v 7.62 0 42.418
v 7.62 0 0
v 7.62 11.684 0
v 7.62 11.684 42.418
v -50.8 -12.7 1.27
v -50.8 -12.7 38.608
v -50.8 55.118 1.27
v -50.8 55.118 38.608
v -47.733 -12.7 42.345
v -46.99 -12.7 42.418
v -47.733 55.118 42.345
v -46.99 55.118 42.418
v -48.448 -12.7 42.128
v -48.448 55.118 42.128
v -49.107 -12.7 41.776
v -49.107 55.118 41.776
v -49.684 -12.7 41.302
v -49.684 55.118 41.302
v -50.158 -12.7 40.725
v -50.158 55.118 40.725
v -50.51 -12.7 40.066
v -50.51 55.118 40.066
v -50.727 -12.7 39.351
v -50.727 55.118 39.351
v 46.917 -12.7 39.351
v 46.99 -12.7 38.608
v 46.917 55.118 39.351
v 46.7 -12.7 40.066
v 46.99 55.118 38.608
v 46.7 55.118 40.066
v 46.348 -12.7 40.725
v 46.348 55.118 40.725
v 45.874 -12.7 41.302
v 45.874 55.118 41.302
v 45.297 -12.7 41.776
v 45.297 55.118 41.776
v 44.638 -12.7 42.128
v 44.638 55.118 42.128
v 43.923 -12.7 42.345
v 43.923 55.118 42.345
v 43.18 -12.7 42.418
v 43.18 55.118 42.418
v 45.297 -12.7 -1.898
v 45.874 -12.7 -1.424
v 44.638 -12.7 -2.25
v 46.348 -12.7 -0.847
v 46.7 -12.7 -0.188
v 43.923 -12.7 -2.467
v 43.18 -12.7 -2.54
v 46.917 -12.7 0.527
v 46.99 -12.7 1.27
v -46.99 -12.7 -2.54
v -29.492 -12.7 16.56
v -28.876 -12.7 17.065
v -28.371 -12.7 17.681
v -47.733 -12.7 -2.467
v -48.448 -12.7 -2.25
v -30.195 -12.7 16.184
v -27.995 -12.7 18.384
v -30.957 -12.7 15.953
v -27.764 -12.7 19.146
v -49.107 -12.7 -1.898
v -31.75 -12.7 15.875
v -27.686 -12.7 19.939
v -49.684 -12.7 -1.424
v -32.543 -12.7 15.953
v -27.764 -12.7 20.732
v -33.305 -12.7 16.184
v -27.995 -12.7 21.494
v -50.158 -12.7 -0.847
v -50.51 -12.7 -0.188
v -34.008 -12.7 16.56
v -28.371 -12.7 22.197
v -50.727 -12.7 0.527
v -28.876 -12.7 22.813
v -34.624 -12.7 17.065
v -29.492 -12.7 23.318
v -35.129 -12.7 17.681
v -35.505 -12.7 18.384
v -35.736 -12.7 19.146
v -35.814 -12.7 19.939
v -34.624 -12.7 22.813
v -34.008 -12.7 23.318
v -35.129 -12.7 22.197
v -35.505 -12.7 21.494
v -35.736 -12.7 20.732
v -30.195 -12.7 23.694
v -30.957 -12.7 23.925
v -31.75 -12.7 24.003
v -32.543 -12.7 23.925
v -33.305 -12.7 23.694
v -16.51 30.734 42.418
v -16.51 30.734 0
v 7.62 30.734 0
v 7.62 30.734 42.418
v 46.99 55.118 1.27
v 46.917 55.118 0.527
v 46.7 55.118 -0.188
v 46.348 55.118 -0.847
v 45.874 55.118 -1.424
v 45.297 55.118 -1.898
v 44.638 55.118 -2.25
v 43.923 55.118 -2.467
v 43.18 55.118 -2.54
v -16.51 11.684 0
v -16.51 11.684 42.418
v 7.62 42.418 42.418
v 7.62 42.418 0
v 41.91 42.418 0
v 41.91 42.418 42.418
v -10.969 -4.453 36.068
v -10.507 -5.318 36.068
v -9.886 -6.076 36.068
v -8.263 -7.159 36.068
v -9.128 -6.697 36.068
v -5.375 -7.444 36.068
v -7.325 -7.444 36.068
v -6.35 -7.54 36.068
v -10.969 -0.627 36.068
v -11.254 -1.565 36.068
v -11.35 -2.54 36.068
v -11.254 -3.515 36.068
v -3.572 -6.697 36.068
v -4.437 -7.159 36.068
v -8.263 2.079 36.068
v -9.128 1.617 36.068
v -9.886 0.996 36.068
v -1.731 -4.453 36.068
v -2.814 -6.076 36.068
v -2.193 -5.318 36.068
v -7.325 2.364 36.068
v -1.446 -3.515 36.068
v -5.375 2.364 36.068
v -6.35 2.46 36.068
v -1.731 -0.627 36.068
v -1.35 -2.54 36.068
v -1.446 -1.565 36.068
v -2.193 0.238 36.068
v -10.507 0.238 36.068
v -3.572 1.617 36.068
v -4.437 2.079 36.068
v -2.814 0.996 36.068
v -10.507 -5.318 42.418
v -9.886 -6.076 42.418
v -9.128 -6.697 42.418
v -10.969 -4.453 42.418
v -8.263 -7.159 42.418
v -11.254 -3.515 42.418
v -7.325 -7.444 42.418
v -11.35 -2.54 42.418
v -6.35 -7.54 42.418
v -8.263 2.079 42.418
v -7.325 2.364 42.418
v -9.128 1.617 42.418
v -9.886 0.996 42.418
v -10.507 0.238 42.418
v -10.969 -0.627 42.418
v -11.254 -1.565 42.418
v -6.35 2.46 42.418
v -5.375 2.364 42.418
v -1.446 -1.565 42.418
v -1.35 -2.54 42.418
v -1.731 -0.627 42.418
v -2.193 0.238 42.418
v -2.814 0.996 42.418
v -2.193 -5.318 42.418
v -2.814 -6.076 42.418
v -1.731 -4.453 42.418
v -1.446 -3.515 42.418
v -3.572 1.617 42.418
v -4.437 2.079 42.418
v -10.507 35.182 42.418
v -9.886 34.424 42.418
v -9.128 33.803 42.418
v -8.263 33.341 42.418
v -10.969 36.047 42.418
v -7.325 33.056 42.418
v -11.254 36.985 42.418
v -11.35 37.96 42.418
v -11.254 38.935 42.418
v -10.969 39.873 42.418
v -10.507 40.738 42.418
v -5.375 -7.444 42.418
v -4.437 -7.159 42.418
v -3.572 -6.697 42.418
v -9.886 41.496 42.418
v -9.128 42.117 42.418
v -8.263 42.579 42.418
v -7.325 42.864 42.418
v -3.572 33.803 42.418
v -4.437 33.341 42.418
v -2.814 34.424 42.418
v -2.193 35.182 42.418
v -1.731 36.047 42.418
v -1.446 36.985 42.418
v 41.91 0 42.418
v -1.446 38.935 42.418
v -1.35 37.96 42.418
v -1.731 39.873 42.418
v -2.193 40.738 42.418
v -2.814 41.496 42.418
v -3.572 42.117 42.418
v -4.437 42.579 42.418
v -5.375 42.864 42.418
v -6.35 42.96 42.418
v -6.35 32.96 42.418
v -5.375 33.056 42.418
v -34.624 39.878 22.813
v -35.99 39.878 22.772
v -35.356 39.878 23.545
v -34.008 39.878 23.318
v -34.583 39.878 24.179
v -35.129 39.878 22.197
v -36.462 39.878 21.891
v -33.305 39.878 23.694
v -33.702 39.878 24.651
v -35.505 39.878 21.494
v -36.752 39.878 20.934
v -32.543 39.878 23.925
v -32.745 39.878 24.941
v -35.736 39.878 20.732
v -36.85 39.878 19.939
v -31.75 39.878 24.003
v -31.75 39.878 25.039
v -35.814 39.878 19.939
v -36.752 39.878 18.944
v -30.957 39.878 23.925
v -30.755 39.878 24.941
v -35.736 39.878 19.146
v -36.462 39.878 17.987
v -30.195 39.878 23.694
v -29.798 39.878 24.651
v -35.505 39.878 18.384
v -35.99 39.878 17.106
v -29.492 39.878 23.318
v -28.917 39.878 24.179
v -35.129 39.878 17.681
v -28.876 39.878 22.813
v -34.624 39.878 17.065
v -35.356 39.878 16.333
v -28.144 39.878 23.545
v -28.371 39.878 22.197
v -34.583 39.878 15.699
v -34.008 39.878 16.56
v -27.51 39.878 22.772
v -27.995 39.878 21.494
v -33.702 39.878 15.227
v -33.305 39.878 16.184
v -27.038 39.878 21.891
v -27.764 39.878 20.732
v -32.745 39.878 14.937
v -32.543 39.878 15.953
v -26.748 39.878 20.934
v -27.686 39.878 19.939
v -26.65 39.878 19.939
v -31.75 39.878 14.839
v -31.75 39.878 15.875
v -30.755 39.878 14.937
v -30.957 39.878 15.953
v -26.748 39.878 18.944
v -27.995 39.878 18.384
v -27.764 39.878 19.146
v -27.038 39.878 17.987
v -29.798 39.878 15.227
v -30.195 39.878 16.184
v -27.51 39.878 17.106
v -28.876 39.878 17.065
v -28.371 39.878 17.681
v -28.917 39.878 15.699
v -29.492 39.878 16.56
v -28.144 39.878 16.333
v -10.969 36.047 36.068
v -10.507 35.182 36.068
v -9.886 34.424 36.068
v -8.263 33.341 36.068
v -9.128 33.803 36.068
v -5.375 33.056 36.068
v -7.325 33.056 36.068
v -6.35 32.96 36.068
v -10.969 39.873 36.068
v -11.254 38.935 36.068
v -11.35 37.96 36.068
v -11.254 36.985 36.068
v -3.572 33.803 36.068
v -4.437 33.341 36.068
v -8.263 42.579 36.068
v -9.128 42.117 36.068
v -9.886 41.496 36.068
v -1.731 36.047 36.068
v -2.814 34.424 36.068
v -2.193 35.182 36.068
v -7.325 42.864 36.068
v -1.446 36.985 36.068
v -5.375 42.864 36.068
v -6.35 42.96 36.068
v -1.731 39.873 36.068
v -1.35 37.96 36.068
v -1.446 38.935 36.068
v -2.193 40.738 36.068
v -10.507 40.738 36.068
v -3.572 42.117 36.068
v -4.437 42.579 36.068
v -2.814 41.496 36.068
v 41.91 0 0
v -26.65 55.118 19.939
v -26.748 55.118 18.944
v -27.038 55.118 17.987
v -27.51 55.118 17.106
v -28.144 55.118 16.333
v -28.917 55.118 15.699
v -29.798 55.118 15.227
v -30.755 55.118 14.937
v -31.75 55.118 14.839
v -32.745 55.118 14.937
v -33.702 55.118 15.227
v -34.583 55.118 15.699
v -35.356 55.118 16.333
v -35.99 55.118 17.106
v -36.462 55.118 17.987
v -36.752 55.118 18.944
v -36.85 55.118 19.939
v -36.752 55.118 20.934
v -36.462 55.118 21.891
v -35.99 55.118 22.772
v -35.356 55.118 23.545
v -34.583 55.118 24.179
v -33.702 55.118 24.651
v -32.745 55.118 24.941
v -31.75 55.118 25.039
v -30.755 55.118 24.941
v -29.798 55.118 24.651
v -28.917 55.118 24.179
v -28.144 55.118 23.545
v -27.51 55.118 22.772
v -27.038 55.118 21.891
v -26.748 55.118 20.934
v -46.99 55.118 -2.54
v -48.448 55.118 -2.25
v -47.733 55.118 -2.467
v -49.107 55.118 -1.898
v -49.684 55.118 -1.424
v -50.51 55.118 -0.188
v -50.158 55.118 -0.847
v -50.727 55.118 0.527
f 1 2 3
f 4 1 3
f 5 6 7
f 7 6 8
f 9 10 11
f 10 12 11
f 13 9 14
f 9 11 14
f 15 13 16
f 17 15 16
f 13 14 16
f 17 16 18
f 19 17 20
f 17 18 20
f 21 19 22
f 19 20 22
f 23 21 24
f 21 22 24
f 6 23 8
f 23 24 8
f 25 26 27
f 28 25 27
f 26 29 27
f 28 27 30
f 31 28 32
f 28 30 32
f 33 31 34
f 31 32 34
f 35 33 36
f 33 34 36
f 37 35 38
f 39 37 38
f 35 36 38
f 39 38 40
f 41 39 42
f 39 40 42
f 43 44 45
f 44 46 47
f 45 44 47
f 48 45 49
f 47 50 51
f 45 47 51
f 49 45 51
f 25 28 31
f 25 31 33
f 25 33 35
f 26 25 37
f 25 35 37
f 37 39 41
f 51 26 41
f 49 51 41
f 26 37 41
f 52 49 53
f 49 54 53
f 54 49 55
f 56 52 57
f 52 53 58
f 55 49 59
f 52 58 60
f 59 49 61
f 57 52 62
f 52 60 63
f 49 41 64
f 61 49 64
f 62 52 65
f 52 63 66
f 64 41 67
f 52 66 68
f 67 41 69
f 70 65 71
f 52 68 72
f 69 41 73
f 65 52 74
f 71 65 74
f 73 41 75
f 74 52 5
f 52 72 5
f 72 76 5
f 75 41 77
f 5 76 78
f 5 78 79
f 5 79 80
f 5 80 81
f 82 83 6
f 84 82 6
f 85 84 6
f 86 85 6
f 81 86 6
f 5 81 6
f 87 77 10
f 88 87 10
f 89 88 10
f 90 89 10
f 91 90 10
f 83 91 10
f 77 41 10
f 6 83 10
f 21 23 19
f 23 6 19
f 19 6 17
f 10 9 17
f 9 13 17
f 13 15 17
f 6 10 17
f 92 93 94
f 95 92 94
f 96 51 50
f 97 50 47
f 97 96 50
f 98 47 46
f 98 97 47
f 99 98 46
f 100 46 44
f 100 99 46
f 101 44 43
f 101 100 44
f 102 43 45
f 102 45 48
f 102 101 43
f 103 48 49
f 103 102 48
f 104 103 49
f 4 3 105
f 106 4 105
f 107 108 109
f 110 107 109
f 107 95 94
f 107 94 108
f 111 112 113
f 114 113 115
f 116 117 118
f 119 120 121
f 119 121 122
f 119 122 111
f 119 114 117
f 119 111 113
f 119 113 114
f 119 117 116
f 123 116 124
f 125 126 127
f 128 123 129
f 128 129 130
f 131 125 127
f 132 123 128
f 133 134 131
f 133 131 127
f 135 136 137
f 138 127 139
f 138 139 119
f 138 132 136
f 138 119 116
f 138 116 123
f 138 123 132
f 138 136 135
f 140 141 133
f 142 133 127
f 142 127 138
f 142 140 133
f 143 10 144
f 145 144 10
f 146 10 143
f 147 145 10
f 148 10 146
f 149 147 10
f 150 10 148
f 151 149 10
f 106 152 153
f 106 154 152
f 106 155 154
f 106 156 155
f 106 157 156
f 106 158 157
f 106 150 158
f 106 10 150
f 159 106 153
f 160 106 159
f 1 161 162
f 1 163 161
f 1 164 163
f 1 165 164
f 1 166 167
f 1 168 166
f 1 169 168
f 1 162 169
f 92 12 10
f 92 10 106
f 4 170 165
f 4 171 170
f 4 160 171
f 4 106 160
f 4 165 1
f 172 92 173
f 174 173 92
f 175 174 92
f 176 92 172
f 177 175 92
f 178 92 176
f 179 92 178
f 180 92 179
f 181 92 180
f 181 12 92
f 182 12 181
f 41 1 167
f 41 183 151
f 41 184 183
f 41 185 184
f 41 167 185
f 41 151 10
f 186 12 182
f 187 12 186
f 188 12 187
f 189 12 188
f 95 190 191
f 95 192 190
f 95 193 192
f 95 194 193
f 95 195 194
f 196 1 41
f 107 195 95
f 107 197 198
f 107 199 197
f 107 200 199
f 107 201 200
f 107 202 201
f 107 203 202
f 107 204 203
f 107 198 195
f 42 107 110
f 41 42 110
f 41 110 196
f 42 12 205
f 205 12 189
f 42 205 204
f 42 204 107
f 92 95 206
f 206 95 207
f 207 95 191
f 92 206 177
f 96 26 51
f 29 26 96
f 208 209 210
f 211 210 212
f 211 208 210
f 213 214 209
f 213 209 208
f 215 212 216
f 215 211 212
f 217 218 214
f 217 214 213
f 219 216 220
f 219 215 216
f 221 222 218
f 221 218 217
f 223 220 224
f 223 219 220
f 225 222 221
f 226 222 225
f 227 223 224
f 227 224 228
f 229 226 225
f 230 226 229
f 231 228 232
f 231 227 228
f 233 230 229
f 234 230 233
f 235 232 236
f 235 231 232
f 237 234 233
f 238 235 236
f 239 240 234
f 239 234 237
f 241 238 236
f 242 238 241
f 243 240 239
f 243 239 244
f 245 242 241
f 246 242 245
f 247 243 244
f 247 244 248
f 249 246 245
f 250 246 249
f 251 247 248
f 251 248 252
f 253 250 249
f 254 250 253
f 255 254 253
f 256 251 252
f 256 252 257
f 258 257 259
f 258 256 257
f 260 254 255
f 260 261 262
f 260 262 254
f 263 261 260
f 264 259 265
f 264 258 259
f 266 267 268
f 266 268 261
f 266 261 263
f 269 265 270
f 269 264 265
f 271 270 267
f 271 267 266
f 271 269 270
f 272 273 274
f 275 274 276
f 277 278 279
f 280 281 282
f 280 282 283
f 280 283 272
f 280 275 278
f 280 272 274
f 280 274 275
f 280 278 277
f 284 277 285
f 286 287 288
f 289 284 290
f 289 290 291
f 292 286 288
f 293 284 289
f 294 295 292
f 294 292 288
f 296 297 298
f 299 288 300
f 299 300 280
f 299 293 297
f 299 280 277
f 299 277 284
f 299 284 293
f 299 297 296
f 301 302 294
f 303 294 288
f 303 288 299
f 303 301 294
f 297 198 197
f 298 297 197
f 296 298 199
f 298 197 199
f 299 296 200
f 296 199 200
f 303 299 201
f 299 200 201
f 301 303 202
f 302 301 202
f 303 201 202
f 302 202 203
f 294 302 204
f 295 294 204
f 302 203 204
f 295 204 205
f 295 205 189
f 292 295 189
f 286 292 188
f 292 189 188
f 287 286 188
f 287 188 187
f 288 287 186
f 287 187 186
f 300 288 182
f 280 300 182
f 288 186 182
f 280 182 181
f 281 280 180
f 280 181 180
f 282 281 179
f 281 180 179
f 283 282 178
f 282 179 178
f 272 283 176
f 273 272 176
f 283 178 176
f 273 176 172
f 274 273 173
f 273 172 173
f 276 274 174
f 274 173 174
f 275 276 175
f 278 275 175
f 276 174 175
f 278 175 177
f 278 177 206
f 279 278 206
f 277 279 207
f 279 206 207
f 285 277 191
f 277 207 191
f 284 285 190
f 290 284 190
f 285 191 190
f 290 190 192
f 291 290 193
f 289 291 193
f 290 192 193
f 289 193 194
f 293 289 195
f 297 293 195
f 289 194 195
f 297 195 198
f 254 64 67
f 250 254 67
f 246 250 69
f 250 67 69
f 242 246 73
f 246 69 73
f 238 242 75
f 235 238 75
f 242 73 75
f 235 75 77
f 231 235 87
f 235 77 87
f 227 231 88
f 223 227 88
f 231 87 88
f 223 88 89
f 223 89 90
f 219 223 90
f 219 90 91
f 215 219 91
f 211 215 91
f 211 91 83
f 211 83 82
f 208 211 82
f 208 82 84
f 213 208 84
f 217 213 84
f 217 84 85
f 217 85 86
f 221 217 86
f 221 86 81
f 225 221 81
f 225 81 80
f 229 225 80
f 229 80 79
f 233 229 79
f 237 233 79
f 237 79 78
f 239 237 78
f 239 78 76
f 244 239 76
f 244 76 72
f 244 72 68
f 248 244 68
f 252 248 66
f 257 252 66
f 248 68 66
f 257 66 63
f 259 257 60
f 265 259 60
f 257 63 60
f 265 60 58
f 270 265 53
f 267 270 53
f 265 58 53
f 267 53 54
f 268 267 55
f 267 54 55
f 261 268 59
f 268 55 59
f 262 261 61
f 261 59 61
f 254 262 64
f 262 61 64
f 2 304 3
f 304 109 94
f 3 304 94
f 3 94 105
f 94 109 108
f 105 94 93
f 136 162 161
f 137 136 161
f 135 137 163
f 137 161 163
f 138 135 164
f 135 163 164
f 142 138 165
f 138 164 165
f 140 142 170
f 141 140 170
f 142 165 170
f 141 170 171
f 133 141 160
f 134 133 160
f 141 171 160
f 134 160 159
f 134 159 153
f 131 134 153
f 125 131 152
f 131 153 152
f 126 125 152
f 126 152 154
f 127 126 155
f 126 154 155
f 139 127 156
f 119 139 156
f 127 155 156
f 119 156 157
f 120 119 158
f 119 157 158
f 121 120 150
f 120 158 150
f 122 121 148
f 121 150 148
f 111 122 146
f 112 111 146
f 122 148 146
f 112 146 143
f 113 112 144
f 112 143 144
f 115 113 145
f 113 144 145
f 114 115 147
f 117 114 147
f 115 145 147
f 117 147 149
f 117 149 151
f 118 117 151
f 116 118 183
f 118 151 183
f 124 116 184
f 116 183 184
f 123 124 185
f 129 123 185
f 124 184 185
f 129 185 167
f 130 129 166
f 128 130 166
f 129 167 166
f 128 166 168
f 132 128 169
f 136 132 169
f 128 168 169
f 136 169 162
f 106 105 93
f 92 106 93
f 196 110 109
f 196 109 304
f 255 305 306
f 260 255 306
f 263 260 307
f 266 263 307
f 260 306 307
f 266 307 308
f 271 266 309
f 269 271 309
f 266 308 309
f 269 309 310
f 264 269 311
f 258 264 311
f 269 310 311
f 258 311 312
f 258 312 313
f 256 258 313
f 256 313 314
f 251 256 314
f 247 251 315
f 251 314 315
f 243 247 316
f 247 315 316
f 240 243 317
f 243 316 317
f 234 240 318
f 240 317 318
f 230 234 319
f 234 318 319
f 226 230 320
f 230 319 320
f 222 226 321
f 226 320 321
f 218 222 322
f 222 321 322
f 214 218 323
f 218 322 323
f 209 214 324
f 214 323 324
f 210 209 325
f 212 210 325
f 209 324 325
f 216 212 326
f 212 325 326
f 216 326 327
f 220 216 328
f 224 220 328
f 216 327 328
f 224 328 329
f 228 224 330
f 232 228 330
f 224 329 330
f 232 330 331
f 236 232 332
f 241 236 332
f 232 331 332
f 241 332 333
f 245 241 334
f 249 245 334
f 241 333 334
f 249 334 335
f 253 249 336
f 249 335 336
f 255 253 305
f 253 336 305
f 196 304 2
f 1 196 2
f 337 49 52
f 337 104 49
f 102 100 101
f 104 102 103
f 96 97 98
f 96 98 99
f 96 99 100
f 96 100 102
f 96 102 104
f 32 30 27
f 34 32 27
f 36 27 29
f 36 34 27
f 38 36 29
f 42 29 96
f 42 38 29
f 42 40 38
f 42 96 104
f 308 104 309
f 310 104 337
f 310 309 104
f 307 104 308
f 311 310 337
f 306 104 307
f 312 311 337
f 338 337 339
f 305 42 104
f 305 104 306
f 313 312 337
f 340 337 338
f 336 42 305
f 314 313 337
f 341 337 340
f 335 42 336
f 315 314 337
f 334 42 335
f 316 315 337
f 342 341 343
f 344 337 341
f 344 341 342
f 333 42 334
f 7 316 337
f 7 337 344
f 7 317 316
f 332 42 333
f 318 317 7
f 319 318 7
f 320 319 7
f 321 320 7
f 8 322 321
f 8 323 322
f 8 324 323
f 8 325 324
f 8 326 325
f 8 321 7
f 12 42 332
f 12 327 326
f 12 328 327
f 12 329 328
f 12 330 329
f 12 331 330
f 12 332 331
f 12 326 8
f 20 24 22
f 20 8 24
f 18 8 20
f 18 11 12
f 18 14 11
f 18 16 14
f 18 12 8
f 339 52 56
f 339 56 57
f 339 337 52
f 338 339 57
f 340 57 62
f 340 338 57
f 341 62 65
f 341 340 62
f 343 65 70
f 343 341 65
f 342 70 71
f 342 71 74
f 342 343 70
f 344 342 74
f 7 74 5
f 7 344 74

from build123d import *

# Parameters (mm, degrees)
SKETCH1_W           = 97.79
SKETCH1_H           = 67.818
BOSS_EXTRUDE1_DEPTH = 42.418
SKETCH2_W           = 97.79
SKETCH2_H           = 67.818
BOSS_EXTRUDE2_DEPTH = 2.54
SKETCH3_R           = 4.064
CUT_EXTRUDE1_DEPTH  = 68.818
SKETCH4_R           = 5
CUT_EXTRUDE2_DEPTH  = 6.35
SKETCH5_R           = 5.1
CUT_EXTRUDE3_DEPTH  = 15.24
FILLET1_R           = 3.81


with BuildPart() as part:
    # Sketch1 → Boss-Extrude1 (new body)
    with BuildSketch(Plane.XY):
        with Locations((-1.905, 21.209)):
            Rectangle(SKETCH1_W, SKETCH1_H)
        Polygon((7.62, 30.734), (7.62, 42.418), (41.91, 42.418), (41.91, 0), (7.62, 0), (7.62, 11.684), (-16.51, 11.684), (-16.51, 30.734), align=None, mode=Mode.SUBTRACT)
    extrude(amount=BOSS_EXTRUDE1_DEPTH)

    # Sketch2 → Boss-Extrude2 (add)
    with BuildSketch(Plane(origin=(0, 0, 0), x_dir=(-1, 0, 0), z_dir=(0, 0, -1))):
        with Locations((1.905, 21.209)):
            Rectangle(SKETCH2_W, SKETCH2_H)
    extrude(amount=BOSS_EXTRUDE2_DEPTH)

    # Sketch3 → Cut-Extrude1 (cut, through all)
    with BuildSketch(Plane.XZ.offset(12.7)):
        with Locations((-31.75, 19.939)):
            Circle(SKETCH3_R)
    extrude(amount=-CUT_EXTRUDE1_DEPTH, mode=Mode.SUBTRACT)

    # Sketch4 → Cut-Extrude2 (cut)
    with BuildSketch(Plane.XY.offset(42.418)):
        with Locations((-6.35, 37.96)):
            Circle(SKETCH4_R)
        with Locations((-6.35, -2.54)):
            Circle(SKETCH4_R)
    extrude(amount=-CUT_EXTRUDE2_DEPTH, mode=Mode.SUBTRACT)

    # Sketch5 → Cut-Extrude3 (cut)
    with BuildSketch(Plane(origin=(0, 55.118, 0), x_dir=(1, 0, 0), z_dir=(0, 1, 0))):
        with Locations((-31.75, -19.939)):
            Circle(SKETCH5_R)
    extrude(amount=-CUT_EXTRUDE3_DEPTH, mode=Mode.SUBTRACT)

    # Fillet1
    fillet1_edges = [part.edges().sort_by_distance(p)[0] for p in [
        (46.99, 21.209, 42.418),
        (46.99, 21.209, -2.54),
        (-50.8, 21.209, -2.54),
        (-50.8, 21.209, 42.418),
    ]]
    fillet(fillet1_edges, radius=FILLET1_R)


solid = part.part
